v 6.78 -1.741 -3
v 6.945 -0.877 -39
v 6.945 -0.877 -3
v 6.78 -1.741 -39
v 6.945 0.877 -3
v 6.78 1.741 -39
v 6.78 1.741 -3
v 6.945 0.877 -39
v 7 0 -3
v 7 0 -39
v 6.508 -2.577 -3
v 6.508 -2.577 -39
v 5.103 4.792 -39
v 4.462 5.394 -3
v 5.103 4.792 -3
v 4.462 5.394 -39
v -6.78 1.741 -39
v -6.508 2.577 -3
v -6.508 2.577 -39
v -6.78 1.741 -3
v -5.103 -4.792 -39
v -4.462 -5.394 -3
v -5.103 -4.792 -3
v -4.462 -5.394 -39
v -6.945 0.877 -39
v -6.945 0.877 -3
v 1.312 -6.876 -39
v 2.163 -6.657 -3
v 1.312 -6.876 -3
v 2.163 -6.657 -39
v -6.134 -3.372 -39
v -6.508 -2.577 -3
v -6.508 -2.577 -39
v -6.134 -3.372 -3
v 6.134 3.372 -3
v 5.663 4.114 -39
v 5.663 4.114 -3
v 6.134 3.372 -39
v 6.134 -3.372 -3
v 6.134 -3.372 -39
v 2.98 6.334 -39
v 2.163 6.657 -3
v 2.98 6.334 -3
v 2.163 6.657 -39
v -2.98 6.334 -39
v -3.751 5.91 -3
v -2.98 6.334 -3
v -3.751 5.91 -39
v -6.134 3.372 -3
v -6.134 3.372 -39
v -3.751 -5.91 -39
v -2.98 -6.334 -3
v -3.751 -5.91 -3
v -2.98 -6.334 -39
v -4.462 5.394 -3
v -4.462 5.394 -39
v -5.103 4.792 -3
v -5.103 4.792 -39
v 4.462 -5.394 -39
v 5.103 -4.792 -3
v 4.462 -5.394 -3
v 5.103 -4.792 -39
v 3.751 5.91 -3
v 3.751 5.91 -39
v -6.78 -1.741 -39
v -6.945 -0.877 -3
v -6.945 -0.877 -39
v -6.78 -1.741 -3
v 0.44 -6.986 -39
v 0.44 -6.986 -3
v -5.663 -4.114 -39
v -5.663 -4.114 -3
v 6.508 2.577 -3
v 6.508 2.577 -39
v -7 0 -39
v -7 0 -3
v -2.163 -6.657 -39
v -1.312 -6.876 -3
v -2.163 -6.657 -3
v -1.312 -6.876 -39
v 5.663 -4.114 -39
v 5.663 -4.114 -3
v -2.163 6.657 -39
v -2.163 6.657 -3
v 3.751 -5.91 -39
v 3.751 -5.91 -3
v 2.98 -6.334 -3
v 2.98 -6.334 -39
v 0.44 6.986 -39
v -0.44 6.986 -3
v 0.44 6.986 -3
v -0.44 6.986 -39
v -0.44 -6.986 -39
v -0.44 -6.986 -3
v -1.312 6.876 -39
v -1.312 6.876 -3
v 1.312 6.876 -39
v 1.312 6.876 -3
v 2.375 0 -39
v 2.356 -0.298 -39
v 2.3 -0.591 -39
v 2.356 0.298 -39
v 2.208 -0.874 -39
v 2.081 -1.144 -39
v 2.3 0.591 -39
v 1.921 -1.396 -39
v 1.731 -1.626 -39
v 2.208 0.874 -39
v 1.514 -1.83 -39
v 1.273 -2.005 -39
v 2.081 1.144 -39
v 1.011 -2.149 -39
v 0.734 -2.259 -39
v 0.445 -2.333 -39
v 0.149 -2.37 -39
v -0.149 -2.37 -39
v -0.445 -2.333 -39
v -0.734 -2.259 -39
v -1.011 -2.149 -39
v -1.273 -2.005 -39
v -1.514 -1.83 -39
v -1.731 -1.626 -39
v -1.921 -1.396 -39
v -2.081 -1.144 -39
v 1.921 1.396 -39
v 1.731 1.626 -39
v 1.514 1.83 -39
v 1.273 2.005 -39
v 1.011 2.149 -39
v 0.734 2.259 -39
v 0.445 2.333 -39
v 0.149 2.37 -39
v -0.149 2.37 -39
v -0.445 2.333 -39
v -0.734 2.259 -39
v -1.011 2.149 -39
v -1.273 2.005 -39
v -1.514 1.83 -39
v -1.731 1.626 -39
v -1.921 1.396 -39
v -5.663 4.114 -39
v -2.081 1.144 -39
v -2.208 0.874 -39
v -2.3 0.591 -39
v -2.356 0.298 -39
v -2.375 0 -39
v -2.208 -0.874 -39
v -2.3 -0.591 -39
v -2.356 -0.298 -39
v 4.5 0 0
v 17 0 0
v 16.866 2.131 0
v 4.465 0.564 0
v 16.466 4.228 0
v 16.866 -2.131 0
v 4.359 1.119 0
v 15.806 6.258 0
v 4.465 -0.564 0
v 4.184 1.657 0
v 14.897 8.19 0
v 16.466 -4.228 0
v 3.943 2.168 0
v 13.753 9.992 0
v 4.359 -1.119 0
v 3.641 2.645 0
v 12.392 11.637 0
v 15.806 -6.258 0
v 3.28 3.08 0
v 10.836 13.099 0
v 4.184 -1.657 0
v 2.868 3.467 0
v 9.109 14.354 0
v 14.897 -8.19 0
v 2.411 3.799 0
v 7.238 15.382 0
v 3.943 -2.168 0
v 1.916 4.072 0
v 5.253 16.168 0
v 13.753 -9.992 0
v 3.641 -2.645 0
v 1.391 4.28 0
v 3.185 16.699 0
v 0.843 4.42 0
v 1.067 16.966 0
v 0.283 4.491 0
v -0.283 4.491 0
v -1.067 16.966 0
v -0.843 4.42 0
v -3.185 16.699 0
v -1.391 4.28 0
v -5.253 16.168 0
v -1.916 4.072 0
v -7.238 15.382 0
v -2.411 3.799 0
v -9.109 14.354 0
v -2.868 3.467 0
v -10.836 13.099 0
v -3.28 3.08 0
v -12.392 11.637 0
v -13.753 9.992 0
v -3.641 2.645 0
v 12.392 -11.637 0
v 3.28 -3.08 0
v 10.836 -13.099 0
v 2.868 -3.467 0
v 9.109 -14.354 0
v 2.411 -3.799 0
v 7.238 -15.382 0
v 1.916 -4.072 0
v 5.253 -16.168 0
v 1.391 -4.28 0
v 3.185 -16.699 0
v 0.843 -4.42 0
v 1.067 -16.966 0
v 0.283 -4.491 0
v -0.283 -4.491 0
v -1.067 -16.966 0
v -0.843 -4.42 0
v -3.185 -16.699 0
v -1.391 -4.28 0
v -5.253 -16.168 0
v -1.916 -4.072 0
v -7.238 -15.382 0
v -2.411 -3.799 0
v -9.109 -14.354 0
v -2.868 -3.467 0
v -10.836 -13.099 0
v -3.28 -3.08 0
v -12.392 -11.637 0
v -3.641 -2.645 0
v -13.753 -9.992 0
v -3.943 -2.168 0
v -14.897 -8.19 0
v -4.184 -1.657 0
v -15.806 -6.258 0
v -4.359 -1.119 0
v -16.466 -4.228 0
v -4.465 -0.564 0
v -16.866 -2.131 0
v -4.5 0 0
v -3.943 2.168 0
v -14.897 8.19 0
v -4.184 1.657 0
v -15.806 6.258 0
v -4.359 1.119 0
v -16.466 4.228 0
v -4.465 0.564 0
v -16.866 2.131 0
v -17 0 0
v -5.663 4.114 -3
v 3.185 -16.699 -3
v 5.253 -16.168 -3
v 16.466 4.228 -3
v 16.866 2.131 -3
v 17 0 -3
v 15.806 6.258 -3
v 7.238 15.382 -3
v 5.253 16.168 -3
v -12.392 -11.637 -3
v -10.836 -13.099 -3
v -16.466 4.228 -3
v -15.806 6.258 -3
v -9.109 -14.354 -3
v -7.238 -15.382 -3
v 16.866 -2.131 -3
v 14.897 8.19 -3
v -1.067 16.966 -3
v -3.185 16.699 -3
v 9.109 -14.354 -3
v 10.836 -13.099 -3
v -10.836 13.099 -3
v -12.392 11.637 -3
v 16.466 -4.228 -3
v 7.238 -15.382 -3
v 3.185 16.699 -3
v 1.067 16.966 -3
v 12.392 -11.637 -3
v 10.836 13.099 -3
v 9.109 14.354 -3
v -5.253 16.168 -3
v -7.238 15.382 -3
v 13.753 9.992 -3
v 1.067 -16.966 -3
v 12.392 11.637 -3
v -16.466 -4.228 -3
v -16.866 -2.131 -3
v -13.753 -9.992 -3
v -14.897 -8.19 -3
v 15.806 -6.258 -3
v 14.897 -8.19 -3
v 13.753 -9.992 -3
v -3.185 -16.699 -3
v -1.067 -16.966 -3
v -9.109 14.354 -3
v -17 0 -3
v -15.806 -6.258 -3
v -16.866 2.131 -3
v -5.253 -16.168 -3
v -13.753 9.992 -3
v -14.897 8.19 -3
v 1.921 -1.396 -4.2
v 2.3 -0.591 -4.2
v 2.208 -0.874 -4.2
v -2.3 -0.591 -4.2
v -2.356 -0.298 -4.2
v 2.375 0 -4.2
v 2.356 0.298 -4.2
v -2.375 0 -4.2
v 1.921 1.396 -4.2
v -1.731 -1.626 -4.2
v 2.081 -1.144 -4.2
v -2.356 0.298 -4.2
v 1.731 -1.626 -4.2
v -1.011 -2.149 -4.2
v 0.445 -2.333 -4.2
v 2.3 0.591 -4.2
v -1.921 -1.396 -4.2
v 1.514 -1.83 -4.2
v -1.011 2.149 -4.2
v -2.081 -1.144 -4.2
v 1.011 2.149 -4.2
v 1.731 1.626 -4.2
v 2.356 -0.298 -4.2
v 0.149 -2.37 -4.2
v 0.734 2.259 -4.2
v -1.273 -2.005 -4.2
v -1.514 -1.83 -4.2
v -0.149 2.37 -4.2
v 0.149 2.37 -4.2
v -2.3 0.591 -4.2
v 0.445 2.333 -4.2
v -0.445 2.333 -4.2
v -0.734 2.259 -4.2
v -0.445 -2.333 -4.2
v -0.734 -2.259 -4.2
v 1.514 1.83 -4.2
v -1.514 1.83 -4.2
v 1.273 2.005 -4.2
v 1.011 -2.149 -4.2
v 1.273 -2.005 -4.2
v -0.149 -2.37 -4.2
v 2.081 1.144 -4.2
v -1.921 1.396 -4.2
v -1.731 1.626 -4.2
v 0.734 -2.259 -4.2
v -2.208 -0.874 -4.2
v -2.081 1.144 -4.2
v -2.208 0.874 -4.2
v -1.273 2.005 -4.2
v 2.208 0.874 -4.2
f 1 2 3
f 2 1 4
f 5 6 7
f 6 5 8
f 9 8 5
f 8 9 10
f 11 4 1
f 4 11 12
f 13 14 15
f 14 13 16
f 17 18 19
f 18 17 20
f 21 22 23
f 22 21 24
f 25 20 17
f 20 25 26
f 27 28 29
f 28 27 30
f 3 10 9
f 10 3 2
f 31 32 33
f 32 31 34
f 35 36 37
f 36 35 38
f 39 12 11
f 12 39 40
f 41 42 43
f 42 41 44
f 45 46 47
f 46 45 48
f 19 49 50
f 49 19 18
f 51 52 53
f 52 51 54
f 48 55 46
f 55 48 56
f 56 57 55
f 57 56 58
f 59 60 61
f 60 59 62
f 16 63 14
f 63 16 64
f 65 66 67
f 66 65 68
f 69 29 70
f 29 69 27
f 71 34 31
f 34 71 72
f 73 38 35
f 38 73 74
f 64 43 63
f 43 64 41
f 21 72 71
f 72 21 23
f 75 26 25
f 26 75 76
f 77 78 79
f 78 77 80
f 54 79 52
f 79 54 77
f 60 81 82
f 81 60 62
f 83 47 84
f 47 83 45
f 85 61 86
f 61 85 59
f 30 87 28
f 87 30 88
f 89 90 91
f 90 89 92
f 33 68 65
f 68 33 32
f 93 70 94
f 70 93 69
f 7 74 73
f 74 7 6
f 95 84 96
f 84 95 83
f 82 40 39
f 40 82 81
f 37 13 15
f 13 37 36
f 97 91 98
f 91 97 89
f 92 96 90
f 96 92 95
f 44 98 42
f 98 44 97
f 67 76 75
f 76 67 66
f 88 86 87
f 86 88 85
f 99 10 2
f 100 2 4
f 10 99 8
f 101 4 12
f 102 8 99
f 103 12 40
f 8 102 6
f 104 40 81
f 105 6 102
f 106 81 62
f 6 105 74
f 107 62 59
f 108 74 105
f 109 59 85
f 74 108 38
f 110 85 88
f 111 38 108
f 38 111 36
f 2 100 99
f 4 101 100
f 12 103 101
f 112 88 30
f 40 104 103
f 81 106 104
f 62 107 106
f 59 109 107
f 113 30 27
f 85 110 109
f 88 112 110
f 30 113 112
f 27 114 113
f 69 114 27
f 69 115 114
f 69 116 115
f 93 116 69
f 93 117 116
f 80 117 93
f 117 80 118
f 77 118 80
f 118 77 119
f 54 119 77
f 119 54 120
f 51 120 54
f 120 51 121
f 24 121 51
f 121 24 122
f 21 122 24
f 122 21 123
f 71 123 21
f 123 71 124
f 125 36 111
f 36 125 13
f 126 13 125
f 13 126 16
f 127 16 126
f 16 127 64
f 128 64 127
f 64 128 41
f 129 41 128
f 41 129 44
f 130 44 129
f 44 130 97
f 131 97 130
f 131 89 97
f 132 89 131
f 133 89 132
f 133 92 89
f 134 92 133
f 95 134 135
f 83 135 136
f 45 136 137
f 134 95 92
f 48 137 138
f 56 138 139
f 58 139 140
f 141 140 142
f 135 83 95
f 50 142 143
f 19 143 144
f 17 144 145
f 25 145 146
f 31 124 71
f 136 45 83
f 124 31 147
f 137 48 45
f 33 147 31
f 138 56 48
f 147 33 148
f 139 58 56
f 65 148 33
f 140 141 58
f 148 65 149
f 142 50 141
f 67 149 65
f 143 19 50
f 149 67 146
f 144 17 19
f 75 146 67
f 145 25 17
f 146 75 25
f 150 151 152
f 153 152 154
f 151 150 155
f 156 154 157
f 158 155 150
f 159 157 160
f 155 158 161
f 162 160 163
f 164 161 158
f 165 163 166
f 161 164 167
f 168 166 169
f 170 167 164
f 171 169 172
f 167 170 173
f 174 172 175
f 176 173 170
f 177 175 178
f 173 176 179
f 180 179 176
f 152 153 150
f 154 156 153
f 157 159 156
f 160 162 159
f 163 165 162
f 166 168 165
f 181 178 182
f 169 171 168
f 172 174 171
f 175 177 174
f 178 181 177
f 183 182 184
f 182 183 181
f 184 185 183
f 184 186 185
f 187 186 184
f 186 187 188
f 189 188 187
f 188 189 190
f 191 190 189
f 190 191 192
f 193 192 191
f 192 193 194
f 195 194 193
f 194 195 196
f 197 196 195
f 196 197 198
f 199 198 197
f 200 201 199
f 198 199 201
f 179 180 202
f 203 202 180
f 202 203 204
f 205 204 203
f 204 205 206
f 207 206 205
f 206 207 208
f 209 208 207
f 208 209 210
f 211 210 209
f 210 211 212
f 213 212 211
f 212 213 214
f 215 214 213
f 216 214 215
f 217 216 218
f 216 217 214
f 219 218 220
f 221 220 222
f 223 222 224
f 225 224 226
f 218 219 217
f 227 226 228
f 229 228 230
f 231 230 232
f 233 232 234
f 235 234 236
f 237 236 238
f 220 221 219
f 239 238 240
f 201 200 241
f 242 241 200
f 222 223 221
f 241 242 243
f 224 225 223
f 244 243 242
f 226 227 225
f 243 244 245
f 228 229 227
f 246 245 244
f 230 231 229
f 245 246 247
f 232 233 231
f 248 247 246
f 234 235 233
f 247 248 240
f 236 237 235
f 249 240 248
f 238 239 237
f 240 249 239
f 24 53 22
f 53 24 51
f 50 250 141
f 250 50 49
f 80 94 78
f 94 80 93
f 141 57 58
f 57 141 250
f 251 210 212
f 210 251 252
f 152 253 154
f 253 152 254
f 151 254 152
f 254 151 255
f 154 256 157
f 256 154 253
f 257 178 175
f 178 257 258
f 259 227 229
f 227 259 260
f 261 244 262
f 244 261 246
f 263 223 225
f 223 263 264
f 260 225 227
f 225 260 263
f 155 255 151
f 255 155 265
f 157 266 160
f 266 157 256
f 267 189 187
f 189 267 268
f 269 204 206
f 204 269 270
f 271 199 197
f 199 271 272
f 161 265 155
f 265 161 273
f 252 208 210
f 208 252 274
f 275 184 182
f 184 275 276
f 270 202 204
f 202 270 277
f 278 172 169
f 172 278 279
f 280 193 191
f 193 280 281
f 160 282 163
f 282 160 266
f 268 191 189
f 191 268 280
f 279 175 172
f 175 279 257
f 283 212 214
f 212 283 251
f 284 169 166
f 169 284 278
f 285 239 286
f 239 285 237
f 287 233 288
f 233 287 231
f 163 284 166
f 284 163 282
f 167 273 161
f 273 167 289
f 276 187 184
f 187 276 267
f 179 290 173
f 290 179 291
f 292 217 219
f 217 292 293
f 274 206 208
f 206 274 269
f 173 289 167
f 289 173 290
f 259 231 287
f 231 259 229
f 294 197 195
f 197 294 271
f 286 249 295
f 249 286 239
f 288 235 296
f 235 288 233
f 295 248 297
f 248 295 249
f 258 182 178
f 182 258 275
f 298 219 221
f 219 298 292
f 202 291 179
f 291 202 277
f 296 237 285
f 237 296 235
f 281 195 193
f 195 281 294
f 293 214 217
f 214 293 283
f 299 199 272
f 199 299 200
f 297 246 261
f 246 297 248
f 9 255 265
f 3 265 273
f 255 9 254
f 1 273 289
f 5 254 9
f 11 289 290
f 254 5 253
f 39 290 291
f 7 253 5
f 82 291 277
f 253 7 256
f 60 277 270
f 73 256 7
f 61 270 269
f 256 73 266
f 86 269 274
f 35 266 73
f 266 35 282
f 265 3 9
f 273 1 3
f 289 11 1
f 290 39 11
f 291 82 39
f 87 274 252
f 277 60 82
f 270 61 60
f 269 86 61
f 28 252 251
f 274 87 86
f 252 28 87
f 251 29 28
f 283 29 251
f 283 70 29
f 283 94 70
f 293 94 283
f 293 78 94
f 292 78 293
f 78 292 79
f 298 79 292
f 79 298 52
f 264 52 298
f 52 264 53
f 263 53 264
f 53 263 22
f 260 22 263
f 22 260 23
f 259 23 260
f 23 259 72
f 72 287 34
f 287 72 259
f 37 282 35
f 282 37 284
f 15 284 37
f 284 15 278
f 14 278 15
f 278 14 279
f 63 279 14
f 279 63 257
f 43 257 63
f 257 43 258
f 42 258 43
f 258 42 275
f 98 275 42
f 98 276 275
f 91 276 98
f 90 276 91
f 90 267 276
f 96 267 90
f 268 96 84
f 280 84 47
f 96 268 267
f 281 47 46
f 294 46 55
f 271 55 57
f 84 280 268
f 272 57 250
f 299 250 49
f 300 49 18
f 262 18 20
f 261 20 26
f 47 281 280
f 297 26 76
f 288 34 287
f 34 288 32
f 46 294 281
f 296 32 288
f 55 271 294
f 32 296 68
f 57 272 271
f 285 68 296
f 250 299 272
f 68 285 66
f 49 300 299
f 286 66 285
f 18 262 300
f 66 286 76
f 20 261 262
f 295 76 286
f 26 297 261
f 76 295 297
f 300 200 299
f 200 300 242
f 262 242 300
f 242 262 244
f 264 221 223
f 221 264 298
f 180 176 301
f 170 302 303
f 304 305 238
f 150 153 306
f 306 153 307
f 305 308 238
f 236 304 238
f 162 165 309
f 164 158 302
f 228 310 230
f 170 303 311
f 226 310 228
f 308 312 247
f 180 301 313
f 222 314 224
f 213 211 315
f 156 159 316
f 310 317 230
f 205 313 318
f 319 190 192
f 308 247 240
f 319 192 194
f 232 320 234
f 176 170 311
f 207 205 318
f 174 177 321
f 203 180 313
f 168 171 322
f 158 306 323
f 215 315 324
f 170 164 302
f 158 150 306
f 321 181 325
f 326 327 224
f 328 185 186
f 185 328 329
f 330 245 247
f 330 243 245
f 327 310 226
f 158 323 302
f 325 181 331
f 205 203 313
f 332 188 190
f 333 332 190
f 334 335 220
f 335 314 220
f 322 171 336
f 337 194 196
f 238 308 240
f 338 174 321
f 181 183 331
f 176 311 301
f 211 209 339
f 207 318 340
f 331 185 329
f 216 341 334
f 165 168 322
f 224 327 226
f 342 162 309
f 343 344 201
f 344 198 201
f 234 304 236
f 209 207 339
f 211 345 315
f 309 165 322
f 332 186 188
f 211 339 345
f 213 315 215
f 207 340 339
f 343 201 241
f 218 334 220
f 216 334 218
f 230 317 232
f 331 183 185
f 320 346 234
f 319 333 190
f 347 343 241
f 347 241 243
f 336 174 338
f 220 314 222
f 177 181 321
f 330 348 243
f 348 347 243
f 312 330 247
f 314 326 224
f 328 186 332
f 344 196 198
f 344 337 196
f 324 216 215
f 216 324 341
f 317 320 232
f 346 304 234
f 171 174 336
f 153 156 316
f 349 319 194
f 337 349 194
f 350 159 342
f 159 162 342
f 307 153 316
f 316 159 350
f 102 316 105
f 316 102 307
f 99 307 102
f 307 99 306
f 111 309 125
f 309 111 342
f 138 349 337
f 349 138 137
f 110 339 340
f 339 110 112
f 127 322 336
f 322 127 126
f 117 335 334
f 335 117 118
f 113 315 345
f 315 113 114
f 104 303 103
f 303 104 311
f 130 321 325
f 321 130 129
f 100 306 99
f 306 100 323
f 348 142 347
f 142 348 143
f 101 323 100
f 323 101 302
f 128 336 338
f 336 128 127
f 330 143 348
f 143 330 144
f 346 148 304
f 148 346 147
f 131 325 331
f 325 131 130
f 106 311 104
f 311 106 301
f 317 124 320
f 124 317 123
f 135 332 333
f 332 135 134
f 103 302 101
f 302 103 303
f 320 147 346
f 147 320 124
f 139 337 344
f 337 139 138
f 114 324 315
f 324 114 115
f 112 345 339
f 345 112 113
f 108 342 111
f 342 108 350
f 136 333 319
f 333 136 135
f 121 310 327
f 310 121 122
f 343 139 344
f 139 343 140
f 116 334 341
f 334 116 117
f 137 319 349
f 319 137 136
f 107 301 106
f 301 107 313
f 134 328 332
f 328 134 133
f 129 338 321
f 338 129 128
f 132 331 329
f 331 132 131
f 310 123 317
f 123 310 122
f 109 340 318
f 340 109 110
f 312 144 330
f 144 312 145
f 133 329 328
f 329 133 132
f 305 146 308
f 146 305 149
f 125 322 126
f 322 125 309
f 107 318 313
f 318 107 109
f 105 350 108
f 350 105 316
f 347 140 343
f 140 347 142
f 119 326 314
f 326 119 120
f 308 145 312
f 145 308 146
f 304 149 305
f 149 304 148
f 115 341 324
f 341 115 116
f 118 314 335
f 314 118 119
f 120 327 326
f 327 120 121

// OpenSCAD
$fn = 50;


difference() {
	union() {
		translate(v = [0, 0, -39.0000000000]) {
			cylinder(h = 39, r = 7.0000000000);
		}
		translate(v = [0, 0, -3.0000000000]) {
			cylinder(h = 3, r = 17.0000000000);
		}
	}
	union() {
		translate(v = [0, 0, 0]) {
			rotate(a = [0, 0, 0]) {
				difference() {
					union() {
						#translate(v = [0, 0, -39.0000000000]) {
							cylinder(h = 39, r = 2.2500000000);
						}
						#translate(v = [0, 0, -4.2000000000]) {
							cylinder(h = 4.2000000000, r = 7.0000000000, r1 = 2.3750000000, r2 = 4.5000000000);
						}
						#translate(v = [0, 0, -39.0000000000]) {
							cylinder(h = 39, r = 2.3750000000);
						}
						#translate(v = [0, 0, -39.0000000000]) {
							cylinder(h = 39, r = 2.2500000000);
						}
					}
					union();
				}
			}
		}
	}
}
